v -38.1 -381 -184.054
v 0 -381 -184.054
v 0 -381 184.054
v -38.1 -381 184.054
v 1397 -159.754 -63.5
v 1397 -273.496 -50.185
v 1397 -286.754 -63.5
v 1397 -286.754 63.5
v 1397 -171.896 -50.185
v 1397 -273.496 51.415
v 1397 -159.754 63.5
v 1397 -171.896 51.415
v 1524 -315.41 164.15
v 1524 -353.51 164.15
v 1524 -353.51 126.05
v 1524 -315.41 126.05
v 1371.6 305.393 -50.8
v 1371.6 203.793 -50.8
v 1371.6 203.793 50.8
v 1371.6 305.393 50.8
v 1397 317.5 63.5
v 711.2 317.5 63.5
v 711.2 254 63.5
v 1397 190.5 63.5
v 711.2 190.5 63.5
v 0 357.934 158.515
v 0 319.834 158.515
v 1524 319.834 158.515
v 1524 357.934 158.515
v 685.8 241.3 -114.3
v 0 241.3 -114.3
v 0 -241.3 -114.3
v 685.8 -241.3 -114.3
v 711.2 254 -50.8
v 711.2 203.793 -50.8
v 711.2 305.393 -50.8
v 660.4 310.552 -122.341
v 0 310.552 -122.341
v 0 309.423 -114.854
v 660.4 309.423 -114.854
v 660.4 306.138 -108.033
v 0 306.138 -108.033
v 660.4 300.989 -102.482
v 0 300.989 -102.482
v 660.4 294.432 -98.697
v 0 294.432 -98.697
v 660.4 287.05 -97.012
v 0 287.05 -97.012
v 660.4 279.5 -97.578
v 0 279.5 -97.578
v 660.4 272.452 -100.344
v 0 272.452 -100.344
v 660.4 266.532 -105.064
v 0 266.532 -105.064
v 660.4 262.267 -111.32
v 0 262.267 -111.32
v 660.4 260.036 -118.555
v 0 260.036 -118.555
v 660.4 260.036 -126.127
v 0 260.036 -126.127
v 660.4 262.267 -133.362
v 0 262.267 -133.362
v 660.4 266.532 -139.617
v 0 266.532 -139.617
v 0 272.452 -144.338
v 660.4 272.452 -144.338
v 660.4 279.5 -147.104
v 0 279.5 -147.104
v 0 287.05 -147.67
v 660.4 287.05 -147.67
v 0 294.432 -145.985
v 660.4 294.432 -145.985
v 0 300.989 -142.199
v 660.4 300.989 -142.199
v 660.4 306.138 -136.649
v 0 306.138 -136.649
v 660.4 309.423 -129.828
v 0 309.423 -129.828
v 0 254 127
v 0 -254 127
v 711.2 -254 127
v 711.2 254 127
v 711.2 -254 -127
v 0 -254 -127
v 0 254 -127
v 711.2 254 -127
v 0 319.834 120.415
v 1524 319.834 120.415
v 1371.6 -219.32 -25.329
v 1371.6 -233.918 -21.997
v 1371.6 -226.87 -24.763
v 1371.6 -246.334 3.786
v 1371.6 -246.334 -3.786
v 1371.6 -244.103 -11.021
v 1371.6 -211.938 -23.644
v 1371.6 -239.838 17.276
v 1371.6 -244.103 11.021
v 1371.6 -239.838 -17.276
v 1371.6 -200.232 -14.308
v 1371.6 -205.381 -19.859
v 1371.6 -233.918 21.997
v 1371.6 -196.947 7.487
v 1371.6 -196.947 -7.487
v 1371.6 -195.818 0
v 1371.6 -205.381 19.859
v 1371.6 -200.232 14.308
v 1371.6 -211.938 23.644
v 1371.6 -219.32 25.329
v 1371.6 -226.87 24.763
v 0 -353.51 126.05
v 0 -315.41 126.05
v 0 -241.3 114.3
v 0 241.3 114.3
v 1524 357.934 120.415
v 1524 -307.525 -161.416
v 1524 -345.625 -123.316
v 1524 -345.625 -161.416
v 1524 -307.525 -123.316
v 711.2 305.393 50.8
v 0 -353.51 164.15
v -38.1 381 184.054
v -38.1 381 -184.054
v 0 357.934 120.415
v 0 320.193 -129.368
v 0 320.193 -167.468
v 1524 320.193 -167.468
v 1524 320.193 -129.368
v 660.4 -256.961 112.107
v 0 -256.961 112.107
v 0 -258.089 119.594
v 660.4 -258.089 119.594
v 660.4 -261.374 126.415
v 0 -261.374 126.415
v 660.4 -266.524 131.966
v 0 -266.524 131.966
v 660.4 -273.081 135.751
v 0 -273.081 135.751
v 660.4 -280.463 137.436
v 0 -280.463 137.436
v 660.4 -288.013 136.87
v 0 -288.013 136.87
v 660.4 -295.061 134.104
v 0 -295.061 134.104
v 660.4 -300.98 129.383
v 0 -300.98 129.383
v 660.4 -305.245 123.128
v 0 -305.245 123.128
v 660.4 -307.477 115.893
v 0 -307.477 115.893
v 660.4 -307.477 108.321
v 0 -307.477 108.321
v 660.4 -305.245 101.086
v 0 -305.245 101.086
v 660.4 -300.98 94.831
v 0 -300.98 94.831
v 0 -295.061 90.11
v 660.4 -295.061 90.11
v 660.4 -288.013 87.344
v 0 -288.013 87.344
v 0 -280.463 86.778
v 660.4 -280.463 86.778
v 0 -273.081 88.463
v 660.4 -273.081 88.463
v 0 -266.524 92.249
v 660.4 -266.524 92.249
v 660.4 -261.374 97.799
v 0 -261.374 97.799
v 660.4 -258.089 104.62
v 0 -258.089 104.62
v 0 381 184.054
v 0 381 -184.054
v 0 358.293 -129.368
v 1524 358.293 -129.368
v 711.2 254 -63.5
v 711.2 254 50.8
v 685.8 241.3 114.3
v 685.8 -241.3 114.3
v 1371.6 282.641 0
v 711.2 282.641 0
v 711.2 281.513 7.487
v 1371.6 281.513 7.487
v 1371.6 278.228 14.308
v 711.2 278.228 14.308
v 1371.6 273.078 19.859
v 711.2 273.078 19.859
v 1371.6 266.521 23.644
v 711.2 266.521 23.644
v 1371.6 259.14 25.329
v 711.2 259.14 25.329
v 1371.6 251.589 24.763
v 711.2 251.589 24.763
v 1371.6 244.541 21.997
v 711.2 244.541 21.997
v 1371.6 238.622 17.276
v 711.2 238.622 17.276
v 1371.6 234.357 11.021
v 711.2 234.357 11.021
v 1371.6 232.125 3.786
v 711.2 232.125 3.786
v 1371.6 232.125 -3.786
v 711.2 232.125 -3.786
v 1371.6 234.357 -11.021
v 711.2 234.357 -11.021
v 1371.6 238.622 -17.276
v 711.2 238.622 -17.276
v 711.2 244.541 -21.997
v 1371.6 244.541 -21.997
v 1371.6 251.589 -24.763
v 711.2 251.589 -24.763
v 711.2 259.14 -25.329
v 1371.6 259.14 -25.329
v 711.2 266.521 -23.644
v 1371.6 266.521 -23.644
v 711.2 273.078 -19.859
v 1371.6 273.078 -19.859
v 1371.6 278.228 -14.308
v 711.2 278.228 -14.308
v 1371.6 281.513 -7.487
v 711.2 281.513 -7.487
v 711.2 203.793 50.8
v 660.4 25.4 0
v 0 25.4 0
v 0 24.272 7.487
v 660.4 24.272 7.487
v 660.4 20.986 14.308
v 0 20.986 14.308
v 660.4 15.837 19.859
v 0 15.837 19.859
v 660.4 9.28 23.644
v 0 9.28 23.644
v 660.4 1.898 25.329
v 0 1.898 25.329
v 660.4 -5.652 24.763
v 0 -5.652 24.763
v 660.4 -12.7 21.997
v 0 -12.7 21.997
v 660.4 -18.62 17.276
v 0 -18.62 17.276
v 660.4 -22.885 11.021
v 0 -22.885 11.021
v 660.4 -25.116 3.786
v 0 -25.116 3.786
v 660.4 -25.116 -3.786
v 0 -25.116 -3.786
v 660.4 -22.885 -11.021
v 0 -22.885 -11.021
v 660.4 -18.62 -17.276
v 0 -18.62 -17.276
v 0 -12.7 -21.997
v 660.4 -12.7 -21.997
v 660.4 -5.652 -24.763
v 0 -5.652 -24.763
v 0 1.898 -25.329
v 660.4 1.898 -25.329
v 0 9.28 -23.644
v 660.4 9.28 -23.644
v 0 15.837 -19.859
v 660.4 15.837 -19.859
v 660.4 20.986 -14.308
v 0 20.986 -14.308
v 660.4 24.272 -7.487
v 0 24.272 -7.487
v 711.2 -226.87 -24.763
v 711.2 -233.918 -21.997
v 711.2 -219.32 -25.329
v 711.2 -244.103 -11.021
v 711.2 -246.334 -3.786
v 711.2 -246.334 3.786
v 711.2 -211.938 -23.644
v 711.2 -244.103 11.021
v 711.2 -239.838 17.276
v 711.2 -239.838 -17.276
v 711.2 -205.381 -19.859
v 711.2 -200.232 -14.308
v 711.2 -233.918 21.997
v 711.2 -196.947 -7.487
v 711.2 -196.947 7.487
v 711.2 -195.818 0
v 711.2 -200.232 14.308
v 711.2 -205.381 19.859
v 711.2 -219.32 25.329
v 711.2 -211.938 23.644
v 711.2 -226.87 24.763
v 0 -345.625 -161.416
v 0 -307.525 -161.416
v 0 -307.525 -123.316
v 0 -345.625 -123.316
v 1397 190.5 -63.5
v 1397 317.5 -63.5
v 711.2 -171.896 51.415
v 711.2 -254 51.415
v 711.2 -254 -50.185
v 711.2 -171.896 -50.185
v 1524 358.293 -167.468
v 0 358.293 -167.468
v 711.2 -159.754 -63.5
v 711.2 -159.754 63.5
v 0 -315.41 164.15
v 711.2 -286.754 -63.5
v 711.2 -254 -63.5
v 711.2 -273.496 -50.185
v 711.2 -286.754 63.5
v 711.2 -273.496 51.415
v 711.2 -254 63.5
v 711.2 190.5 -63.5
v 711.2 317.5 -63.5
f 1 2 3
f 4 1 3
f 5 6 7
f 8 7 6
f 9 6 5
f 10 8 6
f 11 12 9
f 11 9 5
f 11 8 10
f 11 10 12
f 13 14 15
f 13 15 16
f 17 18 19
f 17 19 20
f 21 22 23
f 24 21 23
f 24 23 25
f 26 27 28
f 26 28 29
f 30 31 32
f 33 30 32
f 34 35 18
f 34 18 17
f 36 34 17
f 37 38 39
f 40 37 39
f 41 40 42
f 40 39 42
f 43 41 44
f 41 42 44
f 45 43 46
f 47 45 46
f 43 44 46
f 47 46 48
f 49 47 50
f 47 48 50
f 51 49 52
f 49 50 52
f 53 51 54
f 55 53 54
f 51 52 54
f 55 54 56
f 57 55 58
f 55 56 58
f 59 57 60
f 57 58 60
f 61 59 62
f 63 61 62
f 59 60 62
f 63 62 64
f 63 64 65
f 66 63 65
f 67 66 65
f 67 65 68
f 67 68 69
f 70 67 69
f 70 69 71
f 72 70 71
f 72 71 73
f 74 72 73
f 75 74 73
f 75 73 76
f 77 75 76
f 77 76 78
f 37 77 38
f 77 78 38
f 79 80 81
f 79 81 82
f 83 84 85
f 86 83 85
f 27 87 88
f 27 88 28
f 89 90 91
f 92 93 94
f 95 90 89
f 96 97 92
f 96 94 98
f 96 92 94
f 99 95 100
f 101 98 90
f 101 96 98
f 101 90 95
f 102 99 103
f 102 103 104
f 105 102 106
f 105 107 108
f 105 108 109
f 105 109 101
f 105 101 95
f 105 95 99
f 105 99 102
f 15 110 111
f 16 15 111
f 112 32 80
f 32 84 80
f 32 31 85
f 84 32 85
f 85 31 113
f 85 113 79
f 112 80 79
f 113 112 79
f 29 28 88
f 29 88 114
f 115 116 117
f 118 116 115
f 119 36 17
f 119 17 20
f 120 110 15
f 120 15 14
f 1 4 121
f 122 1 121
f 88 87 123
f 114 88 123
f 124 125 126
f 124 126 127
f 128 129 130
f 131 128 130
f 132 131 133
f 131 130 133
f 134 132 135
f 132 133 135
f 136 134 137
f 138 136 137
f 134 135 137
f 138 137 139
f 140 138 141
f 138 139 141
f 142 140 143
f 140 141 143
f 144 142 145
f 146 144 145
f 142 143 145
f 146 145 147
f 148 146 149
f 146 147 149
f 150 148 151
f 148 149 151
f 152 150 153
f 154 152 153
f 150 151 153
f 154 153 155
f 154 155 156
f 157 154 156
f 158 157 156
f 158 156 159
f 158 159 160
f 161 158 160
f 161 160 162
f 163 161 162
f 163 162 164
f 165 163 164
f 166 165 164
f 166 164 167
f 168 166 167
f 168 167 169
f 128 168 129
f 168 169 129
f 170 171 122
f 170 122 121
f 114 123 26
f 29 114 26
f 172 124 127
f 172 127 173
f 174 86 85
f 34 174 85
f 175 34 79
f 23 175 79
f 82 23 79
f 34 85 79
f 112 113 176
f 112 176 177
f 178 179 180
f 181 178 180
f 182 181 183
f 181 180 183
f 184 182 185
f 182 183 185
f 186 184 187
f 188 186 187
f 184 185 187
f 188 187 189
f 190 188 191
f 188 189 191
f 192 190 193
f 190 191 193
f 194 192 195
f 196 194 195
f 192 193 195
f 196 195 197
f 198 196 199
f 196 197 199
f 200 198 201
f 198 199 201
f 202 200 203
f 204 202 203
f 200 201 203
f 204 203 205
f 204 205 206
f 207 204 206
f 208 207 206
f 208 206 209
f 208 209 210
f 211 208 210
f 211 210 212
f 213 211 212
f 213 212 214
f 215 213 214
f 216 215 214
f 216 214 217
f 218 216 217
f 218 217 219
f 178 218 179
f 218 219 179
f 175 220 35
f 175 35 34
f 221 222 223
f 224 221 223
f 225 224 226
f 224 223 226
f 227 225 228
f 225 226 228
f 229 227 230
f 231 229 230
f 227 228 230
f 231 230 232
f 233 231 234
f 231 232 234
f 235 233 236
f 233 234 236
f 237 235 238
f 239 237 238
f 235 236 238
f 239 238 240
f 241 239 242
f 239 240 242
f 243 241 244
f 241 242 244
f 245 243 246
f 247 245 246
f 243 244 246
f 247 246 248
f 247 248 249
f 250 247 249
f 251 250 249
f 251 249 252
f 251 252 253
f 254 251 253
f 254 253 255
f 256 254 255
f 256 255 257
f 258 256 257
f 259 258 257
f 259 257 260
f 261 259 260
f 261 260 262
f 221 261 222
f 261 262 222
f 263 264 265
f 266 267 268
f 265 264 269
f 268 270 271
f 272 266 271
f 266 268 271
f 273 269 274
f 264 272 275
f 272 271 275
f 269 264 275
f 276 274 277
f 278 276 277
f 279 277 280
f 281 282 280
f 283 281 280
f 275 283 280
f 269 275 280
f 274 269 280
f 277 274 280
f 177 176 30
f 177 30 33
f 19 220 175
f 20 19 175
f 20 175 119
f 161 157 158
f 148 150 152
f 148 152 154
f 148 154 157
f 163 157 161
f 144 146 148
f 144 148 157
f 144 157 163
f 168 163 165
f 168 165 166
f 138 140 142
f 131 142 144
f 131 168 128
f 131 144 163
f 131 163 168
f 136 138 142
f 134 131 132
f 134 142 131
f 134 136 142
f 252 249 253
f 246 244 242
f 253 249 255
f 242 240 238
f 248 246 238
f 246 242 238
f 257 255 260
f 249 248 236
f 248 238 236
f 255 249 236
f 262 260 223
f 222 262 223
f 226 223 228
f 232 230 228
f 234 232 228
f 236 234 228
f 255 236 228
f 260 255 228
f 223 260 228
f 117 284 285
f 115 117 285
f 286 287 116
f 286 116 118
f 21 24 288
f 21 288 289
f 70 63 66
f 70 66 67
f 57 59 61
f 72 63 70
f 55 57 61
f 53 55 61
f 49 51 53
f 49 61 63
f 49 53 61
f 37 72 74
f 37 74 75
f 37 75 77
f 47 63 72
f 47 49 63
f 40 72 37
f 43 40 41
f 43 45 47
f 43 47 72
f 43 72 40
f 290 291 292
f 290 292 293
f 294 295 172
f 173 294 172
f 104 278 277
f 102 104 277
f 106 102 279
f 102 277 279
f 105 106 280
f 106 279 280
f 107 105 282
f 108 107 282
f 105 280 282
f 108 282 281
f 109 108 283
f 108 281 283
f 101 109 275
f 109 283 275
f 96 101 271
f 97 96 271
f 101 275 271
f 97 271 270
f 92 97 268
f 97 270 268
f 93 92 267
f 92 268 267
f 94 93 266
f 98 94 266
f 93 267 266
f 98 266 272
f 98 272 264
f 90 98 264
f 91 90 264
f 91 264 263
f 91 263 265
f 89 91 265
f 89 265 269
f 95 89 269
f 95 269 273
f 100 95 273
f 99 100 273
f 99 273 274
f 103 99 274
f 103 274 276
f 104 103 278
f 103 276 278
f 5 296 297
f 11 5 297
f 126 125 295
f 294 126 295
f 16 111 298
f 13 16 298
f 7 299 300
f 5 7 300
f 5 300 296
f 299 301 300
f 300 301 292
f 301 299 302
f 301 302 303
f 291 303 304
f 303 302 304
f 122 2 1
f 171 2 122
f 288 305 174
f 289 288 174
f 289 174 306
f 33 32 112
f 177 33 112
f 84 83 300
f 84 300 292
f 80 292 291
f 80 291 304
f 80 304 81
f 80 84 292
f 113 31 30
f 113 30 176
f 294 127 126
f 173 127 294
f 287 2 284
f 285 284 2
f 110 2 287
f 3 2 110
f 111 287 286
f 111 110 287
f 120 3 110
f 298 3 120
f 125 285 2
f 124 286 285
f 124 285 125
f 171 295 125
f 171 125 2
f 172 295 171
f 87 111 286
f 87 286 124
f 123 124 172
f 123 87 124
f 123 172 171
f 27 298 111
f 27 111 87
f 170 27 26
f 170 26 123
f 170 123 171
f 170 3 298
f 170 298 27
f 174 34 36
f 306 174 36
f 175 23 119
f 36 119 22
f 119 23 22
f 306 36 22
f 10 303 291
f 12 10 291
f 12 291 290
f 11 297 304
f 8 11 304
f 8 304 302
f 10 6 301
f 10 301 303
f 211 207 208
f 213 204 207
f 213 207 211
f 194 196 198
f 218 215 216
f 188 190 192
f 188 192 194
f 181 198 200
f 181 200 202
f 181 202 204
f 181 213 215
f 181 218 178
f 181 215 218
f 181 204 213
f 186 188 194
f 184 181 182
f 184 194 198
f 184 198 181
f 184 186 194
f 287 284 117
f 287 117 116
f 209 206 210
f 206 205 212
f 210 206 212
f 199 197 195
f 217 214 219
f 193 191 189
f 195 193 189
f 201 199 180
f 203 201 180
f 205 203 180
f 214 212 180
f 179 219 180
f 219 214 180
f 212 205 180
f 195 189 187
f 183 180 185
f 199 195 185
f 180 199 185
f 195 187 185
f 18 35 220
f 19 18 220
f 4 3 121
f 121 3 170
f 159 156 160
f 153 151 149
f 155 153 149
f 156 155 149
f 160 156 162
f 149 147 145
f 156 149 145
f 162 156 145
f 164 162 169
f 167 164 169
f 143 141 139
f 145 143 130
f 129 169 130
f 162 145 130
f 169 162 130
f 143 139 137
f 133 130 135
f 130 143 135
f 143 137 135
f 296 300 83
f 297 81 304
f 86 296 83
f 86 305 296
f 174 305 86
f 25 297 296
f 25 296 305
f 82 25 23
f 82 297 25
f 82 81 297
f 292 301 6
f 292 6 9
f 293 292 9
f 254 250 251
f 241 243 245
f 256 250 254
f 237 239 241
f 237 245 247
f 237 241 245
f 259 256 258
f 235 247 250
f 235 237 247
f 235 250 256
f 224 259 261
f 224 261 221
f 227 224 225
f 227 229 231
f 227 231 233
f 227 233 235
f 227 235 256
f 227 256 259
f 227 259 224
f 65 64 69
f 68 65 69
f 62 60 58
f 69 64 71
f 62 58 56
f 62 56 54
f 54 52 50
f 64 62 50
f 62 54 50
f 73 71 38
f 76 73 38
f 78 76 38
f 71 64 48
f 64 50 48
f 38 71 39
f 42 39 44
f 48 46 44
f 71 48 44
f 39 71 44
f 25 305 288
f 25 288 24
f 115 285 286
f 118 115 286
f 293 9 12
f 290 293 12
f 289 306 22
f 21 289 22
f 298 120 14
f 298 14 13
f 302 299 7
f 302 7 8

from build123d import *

# Parameters (mm, degrees)
F0_W      = 508
F0_H      = 254
F1_DEPTH  = 711.2
F2_W      = 482.6
F2_H      = 228.6
F3_DEPTH  = 685.8
F4_R      = 25.4
F5_DEPTH  = 660.4
F6_W      = 32.7536183119
F6_H      = 127
F6_W_2    = 94.2463816881
F7_DEPTH  = 685.8
F8_W      = 101.6
F8_H      = 101.6
F9_DEPTH  = 685.8
F10_R     = 25.4
F11_DEPTH = 660.4
F12_W     = 762
F12_H     = 368.1078273856
F13_DEPTH = 38.1
F14_W     = 63.5
F14_H     = 127
F15_DEPTH = 685.8
F16_W     = 101.6
F16_H     = 101.6
F17_DEPTH = 660.4
F18_R     = 25.4
F19_DEPTH = 660.4
F20_W     = 38.1
F20_H     = 38.1
F21_DEPTH = 1524
F22_R     = 25.4
F23_DEPTH = 660.4


with BuildPart() as f1:
    # F0 (on Right) → F1 (new body)
    with BuildSketch(Plane.YZ):
        Rectangle(F0_W, F0_H)
    extrude(amount=F1_DEPTH)

    # F2 (on face) → F3 (cut)
    with BuildSketch(Plane(origin=(0, 0, 0), x_dir=(0, -1, 0), z_dir=(-1, 0, 0))):
        Rectangle(F2_W, F2_H)
    extrude(amount=-F3_DEPTH, mode=Mode.SUBTRACT)

    # F6 (on face) → F7 (join)
    with BuildSketch(Plane.YZ.offset(711.2)):
        with Locations((-270.3768091559, 0)):
            Rectangle(F6_W, F6_H)
        with Locations((-206.8768091559, 0)):
            Rectangle(F6_W_2, F6_H)
    extrude(amount=F7_DEPTH)

    # F8 (on face) → F9 (cut)
    with BuildSketch(Plane.YZ.offset(711.2)):
        with Locations((-222.696326673, 0.6148855095)):
            Rectangle(F8_W, F8_H)
    extrude(amount=F9_DEPTH, mode=Mode.SUBTRACT)

    # F14 (on face) → F15 (join)
    with BuildSketch(Plane.YZ.offset(711.2)):
        with Locations((222.25, 0)):
            Rectangle(F14_W, F14_H)
        with Locations((285.75, 0)):
            Rectangle(F14_W, F14_H)
    extrude(amount=F15_DEPTH)

    # F16 (on face) → F17 (cut)
    with BuildSketch(Plane.YZ.offset(711.2)):
        with Locations((254.5926607187, 0)):
            Rectangle(F16_W, F16_H)
    extrude(amount=F17_DEPTH, mode=Mode.SUBTRACT)


with BuildPart() as f5:
    # F4 (on Right) → F5 (new body)
    with BuildSketch(Plane.YZ):
        Circle(F4_R)
    extrude(amount=F5_DEPTH)


with BuildPart() as f11:
    # F10 (on face) → F11 (new body)
    with BuildSketch(Plane.YZ.offset(711.2)):
        with Locations((-221.2180942297, 0)):
            Circle(F10_R)
    extrude(amount=F11_DEPTH)


with BuildPart() as f13:
    # F12 (on Right) → F13 (new body)
    with BuildSketch(Plane.YZ):
        Rectangle(F12_W, F12_H)
    extrude(amount=-F13_DEPTH)

    # F20 (on face) → F21 (join)
    with BuildSketch(Plane.YZ):
        with Locations((339.2434695244, -148.4175494432)):
            Rectangle(F20_W, F20_H)
        with Locations((338.8835170746, 139.4650766134)):
            Rectangle(F20_W, F20_H)
        with Locations((-334.4604074955, 145.0996161673)):
            Rectangle(F20_W, F20_H)
        with Locations((-326.5745958805, -142.3655322313)):
            Rectangle(F20_W, F20_H)
    extrude(amount=F21_DEPTH)


with BuildPart() as f19:
    # F18 (on face) → F19 (new body)
    with BuildSketch(Plane.YZ.offset(711.2)):
        with Locations((257.2414875031, 0)):
            Circle(F18_R)
    extrude(amount=F19_DEPTH)


with BuildPart() as f23:
    # F22 (on face) → F23 (new body)
    with BuildSketch(Plane.YZ):
        with Locations((-282.360881567, 112.1070384979)):
            Circle(F22_R)
    extrude(amount=F23_DEPTH)


with BuildPart() as f23b:
    # F22 (on face) → F23, piece 2 (new body)
    with BuildSketch(Plane.YZ):
        with Locations((285.1519286633, -122.3408728838)):
            Circle(F22_R)
    extrude(amount=F23_DEPTH)


solid = Compound([f1.part, f5.part, f11.part, f13.part, f19.part, f23.part, f23b.part])
